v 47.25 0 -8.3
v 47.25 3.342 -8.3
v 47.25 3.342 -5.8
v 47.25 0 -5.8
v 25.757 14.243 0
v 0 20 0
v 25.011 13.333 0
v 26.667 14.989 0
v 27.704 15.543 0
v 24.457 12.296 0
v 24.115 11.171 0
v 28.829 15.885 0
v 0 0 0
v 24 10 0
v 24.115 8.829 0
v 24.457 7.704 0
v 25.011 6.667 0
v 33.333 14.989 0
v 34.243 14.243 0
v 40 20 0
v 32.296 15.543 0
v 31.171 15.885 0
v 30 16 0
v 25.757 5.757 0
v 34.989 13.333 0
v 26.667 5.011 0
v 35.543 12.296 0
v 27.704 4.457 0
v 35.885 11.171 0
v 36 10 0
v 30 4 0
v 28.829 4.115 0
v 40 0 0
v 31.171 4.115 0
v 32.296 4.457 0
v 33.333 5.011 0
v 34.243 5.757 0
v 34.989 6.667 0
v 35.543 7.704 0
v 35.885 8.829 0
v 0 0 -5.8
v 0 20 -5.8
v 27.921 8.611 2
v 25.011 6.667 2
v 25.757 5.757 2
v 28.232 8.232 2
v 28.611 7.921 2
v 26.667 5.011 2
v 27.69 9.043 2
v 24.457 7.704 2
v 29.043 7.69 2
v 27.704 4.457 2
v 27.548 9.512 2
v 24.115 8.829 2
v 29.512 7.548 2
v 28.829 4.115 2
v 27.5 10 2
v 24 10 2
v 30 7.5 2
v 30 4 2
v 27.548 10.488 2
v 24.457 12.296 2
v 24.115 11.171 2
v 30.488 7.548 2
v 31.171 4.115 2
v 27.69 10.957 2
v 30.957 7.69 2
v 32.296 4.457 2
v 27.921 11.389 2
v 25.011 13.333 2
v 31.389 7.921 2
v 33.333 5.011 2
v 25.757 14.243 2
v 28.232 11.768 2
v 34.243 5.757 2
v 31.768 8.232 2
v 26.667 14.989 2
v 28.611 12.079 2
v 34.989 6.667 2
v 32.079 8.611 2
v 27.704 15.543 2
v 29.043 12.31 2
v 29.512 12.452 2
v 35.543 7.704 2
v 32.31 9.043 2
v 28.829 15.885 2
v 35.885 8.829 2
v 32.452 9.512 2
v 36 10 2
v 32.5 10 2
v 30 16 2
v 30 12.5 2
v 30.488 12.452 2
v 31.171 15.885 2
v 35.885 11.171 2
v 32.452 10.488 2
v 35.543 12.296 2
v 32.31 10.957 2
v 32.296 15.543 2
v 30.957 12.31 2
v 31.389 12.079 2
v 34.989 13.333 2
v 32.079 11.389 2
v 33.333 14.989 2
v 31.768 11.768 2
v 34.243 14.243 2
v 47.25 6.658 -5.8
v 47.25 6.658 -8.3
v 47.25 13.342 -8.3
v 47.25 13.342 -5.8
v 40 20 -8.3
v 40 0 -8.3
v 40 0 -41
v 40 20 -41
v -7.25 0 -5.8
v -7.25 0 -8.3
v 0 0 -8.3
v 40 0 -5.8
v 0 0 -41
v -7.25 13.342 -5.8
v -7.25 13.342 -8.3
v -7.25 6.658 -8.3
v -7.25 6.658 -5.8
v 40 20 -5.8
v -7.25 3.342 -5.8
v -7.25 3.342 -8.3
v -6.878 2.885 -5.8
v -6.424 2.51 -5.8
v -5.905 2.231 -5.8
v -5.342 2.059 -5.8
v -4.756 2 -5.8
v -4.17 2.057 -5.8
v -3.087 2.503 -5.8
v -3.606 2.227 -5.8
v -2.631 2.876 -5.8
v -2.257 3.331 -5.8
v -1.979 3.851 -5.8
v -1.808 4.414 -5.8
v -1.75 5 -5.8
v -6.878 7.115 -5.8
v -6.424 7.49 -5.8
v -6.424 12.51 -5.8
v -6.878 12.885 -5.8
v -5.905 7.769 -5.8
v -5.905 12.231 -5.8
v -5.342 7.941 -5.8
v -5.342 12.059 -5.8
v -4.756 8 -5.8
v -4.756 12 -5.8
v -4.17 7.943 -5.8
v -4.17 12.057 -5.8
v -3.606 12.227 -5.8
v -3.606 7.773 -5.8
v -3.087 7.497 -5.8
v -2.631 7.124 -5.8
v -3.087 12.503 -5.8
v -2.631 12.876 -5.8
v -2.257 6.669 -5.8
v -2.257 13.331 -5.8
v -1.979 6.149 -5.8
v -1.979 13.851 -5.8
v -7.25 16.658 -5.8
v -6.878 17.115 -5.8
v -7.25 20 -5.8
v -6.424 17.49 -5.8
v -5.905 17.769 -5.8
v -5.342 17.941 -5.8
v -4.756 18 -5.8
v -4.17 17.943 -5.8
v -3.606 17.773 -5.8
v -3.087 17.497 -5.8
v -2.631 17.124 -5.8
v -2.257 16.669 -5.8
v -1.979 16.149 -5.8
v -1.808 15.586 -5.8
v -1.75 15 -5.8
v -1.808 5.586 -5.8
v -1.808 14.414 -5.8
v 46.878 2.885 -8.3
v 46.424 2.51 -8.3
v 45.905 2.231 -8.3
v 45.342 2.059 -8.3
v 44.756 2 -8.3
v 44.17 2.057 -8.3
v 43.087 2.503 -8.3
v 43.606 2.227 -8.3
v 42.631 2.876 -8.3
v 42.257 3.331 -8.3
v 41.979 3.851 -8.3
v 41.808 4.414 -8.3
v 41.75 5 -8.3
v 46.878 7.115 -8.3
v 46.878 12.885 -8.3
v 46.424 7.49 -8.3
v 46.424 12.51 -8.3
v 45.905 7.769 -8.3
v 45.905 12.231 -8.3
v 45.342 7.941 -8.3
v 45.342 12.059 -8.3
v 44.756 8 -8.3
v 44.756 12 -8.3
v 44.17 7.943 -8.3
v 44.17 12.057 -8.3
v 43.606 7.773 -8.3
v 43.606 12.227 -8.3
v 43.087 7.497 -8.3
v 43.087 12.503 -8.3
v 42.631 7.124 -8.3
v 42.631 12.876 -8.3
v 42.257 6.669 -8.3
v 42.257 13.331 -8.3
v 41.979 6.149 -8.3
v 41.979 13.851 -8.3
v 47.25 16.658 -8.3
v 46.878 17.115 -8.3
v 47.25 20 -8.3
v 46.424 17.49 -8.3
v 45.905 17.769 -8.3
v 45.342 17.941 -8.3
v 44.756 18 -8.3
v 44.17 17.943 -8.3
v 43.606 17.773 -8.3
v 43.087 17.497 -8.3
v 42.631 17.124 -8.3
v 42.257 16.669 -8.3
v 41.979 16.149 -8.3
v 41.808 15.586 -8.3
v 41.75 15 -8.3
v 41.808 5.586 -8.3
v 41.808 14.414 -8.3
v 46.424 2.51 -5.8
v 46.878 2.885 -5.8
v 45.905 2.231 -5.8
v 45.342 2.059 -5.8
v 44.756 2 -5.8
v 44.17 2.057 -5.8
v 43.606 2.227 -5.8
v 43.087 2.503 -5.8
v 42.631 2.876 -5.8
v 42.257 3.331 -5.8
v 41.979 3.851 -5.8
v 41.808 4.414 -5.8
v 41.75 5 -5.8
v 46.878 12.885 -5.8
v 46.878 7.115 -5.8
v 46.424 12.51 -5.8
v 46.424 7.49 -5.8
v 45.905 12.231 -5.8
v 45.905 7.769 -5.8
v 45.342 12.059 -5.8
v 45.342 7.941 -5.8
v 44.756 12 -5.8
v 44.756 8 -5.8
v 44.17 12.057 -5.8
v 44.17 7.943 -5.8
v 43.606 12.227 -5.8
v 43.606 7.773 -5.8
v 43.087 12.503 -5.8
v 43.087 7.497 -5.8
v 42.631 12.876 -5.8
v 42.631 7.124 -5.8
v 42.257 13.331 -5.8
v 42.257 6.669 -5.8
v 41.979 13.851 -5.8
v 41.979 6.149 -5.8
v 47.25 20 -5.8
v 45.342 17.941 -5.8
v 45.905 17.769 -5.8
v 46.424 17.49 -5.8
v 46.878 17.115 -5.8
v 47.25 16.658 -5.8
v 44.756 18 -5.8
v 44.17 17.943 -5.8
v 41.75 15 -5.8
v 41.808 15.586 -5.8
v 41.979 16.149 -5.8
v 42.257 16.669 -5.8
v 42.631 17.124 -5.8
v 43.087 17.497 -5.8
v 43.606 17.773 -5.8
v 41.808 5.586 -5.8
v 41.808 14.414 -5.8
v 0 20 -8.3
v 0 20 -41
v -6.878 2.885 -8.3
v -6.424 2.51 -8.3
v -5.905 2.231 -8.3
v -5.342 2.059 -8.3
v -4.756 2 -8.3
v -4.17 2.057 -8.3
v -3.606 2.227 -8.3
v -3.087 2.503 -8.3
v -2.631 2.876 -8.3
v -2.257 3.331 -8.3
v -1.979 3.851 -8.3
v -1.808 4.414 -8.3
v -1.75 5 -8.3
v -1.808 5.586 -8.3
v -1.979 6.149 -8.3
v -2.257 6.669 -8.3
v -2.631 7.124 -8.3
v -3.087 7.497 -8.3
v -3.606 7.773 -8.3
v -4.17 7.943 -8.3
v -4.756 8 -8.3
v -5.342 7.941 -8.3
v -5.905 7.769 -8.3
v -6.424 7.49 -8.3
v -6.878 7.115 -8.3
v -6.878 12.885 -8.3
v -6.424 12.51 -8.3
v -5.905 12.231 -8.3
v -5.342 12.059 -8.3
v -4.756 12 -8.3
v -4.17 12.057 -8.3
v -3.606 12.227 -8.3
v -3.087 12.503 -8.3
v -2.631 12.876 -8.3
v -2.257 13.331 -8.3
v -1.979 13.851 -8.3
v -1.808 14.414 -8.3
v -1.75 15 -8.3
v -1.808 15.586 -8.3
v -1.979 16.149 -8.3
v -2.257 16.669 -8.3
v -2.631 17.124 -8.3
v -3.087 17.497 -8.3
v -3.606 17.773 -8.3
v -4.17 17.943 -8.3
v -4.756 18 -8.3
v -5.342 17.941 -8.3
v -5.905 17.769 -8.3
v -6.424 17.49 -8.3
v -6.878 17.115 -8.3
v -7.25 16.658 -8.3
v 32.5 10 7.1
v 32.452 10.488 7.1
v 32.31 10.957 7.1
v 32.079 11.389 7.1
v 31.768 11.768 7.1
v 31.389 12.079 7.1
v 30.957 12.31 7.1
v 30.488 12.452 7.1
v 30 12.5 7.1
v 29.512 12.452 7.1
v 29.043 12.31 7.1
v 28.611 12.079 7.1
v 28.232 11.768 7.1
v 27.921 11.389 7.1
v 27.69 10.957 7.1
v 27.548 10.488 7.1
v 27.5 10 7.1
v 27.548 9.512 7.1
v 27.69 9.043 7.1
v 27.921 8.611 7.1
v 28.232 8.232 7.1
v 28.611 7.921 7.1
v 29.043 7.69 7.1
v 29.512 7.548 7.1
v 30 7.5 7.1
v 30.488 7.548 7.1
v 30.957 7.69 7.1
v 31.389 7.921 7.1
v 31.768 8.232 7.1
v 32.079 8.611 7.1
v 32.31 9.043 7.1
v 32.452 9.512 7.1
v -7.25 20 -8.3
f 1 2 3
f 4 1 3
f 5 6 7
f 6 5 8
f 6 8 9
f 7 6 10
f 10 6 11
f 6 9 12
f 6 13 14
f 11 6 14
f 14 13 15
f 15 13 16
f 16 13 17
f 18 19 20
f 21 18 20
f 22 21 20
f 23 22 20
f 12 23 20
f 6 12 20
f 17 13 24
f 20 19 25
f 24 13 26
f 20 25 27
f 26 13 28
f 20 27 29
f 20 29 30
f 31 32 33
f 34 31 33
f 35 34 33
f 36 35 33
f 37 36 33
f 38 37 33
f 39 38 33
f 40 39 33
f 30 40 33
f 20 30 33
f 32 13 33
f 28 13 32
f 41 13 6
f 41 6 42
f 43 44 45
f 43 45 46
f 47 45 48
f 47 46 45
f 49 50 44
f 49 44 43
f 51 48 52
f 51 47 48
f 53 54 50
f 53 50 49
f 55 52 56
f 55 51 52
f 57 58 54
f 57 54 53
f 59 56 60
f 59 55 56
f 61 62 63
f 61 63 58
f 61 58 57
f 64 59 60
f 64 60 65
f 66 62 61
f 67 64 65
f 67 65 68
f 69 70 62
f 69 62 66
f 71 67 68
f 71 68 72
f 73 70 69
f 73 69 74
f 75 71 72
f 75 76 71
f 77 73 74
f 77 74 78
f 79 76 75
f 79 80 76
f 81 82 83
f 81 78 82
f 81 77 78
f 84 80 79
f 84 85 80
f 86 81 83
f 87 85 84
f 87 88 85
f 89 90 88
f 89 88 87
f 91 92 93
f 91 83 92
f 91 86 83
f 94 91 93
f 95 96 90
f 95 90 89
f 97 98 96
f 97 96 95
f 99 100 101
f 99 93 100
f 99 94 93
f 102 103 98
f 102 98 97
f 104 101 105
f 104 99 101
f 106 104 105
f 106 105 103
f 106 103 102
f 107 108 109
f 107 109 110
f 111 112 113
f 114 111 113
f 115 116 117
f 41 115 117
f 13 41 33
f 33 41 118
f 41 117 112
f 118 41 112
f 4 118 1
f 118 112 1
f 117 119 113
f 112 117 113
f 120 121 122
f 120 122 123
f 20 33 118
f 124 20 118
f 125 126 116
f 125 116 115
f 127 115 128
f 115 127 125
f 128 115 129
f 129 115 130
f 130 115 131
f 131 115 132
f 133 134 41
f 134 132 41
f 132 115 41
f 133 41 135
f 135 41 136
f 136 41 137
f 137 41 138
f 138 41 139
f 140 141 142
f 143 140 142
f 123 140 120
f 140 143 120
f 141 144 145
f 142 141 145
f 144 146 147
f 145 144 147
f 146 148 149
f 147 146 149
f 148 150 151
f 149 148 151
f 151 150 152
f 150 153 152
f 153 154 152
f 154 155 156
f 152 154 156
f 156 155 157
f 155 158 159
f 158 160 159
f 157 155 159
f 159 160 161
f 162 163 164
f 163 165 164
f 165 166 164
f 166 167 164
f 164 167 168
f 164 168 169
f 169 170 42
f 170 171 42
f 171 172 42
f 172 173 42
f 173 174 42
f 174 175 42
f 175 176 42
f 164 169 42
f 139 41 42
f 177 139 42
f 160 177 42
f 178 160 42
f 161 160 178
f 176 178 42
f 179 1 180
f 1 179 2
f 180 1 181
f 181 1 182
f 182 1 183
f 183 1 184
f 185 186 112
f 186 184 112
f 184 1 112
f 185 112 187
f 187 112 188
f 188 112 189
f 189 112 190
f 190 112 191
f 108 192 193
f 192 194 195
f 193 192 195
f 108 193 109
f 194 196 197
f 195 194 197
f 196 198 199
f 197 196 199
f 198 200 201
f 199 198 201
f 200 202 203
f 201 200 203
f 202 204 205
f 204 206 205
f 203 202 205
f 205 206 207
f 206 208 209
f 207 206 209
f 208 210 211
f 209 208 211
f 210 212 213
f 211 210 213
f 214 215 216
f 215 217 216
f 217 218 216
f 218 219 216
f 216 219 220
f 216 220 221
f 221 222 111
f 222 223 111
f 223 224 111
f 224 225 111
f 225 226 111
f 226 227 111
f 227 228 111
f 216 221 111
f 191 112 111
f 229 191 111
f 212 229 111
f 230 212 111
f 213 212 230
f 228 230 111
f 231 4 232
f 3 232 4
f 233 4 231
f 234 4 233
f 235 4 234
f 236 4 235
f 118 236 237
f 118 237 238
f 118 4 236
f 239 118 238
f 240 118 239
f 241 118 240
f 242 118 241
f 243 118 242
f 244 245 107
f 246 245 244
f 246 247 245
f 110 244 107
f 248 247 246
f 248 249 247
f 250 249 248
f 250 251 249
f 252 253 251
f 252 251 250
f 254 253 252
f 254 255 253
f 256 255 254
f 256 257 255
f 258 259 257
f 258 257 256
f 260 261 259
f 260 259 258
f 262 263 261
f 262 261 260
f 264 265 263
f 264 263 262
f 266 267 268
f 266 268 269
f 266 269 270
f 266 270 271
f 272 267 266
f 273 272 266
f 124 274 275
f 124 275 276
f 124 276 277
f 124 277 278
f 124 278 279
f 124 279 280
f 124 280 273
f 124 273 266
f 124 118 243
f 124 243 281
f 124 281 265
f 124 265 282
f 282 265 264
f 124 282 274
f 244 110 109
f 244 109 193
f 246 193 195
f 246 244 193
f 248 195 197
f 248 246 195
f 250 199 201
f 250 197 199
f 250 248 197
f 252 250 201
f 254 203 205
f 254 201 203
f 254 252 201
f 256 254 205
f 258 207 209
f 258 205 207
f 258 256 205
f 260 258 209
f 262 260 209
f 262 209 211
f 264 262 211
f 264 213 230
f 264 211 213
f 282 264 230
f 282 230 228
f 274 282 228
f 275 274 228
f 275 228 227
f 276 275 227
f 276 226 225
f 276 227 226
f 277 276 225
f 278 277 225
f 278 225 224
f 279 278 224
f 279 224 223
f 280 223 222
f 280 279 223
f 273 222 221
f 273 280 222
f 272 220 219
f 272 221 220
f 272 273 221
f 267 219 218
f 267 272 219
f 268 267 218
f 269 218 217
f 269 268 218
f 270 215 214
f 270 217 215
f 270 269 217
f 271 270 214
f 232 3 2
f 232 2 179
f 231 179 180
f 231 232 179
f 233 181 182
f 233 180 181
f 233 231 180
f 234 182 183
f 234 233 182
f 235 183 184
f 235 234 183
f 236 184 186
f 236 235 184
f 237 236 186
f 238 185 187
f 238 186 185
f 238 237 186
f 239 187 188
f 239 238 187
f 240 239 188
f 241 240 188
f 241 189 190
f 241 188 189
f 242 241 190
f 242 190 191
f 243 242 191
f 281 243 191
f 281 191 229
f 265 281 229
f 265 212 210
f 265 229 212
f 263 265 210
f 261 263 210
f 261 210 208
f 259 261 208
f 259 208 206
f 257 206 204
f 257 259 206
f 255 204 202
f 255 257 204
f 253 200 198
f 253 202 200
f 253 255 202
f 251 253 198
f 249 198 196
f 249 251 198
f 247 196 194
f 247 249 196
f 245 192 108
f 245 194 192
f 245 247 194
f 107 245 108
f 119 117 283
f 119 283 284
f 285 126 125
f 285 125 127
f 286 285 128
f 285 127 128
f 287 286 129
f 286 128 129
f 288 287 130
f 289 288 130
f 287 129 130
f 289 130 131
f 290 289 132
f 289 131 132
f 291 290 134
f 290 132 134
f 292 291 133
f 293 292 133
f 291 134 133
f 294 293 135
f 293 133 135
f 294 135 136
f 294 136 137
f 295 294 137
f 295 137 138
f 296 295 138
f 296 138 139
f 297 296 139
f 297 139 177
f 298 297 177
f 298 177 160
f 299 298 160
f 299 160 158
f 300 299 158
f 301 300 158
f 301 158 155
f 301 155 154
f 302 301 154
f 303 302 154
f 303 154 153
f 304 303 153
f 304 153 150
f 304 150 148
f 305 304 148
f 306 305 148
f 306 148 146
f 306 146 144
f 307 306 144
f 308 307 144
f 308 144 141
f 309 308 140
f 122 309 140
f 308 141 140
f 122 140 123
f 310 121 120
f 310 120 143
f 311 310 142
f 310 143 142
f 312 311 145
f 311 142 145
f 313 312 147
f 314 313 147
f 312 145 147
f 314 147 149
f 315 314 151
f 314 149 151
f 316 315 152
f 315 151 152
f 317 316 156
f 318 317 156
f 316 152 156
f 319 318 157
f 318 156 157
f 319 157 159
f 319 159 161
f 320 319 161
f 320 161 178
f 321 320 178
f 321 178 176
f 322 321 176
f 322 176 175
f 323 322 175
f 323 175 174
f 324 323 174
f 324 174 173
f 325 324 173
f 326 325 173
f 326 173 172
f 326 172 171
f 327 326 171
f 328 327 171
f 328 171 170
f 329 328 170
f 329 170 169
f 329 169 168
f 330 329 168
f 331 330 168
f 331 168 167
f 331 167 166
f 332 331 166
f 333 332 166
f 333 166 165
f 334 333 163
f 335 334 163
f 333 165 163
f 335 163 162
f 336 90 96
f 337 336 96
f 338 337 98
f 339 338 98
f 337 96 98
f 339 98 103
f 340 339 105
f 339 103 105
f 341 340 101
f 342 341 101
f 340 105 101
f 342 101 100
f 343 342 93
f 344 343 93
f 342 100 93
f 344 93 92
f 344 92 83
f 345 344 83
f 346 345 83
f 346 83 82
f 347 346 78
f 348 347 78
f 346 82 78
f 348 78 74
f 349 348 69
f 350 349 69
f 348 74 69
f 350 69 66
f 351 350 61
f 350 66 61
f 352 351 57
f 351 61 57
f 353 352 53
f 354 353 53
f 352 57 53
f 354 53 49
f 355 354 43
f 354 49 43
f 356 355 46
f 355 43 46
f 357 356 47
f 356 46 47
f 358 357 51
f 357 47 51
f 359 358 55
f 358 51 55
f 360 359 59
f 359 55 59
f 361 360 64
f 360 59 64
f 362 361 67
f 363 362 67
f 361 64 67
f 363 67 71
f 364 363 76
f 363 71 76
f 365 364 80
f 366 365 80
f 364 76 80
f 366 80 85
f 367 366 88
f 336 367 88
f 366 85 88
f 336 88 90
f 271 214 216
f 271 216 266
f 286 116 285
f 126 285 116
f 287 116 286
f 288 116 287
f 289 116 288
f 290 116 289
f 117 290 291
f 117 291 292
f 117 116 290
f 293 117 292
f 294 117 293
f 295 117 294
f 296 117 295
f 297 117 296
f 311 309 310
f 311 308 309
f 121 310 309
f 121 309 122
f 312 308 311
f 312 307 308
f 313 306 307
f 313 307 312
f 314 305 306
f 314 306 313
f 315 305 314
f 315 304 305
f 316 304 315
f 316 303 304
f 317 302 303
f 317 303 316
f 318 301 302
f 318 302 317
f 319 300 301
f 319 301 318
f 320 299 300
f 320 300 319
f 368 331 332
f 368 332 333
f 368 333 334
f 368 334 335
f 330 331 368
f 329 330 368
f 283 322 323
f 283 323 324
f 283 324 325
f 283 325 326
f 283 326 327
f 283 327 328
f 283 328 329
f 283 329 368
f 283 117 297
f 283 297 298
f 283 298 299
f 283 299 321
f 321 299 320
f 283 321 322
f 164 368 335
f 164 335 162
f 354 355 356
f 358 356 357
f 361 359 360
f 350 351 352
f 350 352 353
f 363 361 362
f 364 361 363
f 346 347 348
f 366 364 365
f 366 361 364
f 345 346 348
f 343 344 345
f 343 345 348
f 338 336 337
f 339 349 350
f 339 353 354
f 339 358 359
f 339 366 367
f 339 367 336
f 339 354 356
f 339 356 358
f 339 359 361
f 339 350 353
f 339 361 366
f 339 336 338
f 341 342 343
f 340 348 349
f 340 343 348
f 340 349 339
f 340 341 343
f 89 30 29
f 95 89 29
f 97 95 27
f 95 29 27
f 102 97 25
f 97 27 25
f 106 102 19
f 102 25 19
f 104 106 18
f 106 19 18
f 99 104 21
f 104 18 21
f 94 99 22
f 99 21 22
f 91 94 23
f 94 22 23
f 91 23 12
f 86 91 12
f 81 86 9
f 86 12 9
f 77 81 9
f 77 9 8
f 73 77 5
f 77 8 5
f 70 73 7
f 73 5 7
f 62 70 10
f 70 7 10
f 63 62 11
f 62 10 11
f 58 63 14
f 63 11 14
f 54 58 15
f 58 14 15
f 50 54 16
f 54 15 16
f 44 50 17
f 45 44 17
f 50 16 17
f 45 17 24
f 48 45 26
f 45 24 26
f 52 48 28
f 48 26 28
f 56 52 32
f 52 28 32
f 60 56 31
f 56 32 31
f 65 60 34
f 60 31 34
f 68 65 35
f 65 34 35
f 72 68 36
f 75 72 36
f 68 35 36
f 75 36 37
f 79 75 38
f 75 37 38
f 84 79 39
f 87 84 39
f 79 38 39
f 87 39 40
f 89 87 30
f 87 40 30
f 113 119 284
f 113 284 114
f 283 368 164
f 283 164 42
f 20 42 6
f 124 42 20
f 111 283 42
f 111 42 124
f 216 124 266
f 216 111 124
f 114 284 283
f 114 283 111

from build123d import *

# Parameters (mm, degrees)
SKETCH_1_W          = 40
SKETCH_1_H          = 41
EXTRUDE_1_DEPTH     = 20
SKETCH_2_R          = 6
EXTRUDE_2_DEPTH     = 2
SKETCH_3_R          = 2.5
EXTRUDE_3_DEPTH     = 5.1
SKETCH_4_W          = 2.5
SKETCH_4_H          = 20
EXTRUDE_4_DEPTH     = 7.25
SKETCH_5_R          = 3
CUT_EXTRUDE_2_DEPTH = 2.5


with BuildPart() as part:
    # 草图1 → 凸台-拉伸1 (new body)
    with BuildSketch(Plane(origin=(0, 0, 0), x_dir=(1, 0, 0), z_dir=(0, 1, 0))):
        with Locations((20, 20.5)):
            Rectangle(SKETCH_1_W, SKETCH_1_H)
    extrude(amount=EXTRUDE_1_DEPTH)

    # 草图2 → 凸台-拉伸2 (add)
    with BuildSketch(Plane.XY):
        with Locations((30, 10)):
            Circle(SKETCH_2_R)
    extrude(amount=EXTRUDE_2_DEPTH)

    # 草图3 → 凸台-拉伸3 (add)
    with BuildSketch(Plane.XY.offset(2)):
        with Locations((30, 10)):
            Circle(SKETCH_3_R)
    extrude(amount=EXTRUDE_3_DEPTH)

    # 草图4 → 凸台-拉伸4 (add)
    with BuildSketch(Plane.ZY):
        with Locations((-7.05, 10)):
            Rectangle(SKETCH_4_W, SKETCH_4_H)
    extrude_4 = extrude(amount=EXTRUDE_4_DEPTH)

    # 草图5 → 切除-拉伸2 (cut)
    with BuildSketch(Plane.XY.offset(-5.8)):
        with Locations((-4.75, 15)):
            Circle(SKETCH_5_R)
        with Locations((-4.75, 5)):
            Circle(SKETCH_5_R)
    cut_extrude_2 = extrude(amount=-CUT_EXTRUDE_2_DEPTH, mode=Mode.SUBTRACT)

    # 镜向1: 凸台-拉伸4, 切除-拉伸2 across plane
    add(extrude_4.mirror(Plane.ZY.offset(-20)))
    add(cut_extrude_2.mirror(Plane.ZY.offset(-20)), mode=Mode.SUBTRACT)


solid = part.part
